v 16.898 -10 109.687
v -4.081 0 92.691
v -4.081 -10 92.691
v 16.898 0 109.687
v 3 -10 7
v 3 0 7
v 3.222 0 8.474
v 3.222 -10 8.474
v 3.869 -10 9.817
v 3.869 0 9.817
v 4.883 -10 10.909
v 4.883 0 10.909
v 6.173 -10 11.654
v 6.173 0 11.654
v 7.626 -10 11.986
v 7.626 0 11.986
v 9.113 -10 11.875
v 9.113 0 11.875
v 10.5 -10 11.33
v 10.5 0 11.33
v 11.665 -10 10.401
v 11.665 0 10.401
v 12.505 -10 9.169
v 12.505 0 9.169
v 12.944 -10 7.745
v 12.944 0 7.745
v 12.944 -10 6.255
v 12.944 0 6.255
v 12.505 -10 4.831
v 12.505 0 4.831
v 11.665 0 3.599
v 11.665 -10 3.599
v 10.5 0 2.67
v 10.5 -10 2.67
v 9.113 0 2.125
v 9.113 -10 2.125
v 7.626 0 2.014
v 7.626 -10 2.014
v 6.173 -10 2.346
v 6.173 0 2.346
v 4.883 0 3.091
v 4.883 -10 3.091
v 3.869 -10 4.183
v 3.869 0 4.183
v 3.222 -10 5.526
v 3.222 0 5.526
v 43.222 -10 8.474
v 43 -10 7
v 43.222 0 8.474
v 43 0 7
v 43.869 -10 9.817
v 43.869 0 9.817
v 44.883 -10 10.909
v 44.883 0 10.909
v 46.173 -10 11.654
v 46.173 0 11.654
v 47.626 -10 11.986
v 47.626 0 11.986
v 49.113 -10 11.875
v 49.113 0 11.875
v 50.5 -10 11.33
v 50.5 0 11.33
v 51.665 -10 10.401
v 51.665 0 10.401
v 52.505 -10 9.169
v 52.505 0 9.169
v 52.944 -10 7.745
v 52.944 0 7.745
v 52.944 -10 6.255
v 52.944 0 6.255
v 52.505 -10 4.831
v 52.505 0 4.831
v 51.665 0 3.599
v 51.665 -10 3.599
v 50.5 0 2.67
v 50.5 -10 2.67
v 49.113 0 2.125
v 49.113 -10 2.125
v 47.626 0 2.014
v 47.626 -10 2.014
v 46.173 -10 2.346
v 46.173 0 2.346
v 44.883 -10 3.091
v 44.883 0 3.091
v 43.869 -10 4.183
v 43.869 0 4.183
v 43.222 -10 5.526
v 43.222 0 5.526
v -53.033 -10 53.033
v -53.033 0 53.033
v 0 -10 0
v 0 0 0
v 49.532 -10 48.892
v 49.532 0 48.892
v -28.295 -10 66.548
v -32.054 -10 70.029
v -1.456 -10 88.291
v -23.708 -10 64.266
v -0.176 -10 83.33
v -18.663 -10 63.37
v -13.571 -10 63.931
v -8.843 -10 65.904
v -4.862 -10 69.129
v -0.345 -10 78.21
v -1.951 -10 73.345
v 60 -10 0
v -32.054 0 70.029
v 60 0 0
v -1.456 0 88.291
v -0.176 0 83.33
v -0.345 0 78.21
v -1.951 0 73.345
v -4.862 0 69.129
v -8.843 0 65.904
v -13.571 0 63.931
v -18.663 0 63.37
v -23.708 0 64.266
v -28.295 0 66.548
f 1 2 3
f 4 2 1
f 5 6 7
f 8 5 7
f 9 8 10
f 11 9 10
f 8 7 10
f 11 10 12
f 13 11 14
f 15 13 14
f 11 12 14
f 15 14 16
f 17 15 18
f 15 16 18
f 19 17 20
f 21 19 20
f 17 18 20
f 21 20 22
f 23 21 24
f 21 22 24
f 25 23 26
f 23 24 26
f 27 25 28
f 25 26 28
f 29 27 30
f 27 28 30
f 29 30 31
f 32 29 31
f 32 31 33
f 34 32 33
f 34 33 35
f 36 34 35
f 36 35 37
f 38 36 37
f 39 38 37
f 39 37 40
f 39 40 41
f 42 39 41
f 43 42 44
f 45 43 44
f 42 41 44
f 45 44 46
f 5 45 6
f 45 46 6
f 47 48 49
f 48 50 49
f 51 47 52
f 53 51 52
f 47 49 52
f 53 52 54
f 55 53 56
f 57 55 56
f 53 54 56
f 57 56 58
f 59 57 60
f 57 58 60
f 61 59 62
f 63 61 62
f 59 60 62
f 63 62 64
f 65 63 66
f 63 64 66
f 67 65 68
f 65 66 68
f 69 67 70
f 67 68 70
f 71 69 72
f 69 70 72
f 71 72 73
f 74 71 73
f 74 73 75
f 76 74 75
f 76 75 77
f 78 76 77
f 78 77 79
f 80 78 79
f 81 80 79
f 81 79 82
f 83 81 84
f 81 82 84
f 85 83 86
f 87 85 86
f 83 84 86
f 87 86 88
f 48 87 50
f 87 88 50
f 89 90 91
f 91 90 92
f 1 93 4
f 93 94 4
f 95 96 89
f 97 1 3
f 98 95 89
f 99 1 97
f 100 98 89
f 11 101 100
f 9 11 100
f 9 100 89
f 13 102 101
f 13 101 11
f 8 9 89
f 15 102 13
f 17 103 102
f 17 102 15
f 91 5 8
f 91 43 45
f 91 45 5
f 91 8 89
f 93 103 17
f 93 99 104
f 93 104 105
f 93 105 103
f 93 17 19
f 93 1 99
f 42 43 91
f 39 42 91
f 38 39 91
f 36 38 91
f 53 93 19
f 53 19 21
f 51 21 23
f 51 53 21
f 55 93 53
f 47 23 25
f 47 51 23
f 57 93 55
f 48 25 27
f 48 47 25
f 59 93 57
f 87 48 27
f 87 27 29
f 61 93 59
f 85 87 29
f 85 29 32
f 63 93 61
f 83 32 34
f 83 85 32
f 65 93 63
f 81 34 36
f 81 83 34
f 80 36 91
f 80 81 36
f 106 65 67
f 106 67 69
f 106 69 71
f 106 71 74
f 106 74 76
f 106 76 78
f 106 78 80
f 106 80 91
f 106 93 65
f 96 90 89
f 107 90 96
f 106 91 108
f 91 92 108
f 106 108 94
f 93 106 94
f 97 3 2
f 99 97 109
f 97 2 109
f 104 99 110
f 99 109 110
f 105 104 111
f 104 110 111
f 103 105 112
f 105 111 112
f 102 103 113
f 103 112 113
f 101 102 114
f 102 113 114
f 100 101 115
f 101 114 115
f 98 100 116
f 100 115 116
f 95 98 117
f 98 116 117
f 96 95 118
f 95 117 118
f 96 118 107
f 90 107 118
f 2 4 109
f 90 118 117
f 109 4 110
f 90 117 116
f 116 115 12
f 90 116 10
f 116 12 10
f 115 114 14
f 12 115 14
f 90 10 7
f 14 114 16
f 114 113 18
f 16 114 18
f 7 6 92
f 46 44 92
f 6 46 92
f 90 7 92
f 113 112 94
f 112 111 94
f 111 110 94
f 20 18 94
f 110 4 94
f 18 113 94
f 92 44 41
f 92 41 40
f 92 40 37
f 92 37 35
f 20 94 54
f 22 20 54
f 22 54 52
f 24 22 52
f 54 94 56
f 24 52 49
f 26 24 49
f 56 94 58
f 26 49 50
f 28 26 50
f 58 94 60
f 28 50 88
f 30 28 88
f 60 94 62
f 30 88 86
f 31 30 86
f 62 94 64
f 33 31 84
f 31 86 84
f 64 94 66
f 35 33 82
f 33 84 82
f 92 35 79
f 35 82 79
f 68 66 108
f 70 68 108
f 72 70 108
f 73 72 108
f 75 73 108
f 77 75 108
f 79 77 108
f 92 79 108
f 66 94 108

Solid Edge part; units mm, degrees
sketch "Sketch1" plane through (0, 0, 0) normal (0, -1, 0) x (1, 0, 0)
  line L0 (-53.033, 53.033) -> (0, 0)
  line L1 (0, 0) -> (60, 0)
  line L2 (60, 0) -> (49.5321, 48.892)
  line L3 (49.5321, 48.892) -> (16.898, 109.6868)
  line L4 (-53.033, 53.033) -> (16.898, 109.6868)
  dimension "D1" = 75
  dimension "D2" = 60
  dimension "D3" = 50
  dimension "D4" = 69
  dimension "D5" = 90
extrude "Protrusion1" add sketch "Sketch1" along normal blind 10
sketch "Sketch2" plane through (-1.5165, 0, 51.9599) normal (0, 1, 0) x (-1, 0, 0)
  line L0 (2.5648, 40.7308) -> (30.5372, 18.0693)
  arc A0 (30.5372, 18.0693) -> (2.5648, 40.7308) centre (16.551, 29.4) cw
  dimension "D1" = 36
  dimension "D2" = 36
extrude "Cutout1" cut sketch "Sketch2" against normal up to next
sketch "Sketch3" plane through (3.4835, 0, 54.8434) normal (0, 1, 0) x (-1, 0, 0)
  circle A0 centre (-44.5165, -47.8434) radius 5
  circle A1 centre (-4.5165, -47.8434) radius 5
  dimension "D1" = 7
  dimension "D2" = 10
  dimension "D3" = 10
  dimension "D4" = 40
  dimension "D5" = 12
extrude "Cutout2" cut sketch "Sketch3" against normal up to next
